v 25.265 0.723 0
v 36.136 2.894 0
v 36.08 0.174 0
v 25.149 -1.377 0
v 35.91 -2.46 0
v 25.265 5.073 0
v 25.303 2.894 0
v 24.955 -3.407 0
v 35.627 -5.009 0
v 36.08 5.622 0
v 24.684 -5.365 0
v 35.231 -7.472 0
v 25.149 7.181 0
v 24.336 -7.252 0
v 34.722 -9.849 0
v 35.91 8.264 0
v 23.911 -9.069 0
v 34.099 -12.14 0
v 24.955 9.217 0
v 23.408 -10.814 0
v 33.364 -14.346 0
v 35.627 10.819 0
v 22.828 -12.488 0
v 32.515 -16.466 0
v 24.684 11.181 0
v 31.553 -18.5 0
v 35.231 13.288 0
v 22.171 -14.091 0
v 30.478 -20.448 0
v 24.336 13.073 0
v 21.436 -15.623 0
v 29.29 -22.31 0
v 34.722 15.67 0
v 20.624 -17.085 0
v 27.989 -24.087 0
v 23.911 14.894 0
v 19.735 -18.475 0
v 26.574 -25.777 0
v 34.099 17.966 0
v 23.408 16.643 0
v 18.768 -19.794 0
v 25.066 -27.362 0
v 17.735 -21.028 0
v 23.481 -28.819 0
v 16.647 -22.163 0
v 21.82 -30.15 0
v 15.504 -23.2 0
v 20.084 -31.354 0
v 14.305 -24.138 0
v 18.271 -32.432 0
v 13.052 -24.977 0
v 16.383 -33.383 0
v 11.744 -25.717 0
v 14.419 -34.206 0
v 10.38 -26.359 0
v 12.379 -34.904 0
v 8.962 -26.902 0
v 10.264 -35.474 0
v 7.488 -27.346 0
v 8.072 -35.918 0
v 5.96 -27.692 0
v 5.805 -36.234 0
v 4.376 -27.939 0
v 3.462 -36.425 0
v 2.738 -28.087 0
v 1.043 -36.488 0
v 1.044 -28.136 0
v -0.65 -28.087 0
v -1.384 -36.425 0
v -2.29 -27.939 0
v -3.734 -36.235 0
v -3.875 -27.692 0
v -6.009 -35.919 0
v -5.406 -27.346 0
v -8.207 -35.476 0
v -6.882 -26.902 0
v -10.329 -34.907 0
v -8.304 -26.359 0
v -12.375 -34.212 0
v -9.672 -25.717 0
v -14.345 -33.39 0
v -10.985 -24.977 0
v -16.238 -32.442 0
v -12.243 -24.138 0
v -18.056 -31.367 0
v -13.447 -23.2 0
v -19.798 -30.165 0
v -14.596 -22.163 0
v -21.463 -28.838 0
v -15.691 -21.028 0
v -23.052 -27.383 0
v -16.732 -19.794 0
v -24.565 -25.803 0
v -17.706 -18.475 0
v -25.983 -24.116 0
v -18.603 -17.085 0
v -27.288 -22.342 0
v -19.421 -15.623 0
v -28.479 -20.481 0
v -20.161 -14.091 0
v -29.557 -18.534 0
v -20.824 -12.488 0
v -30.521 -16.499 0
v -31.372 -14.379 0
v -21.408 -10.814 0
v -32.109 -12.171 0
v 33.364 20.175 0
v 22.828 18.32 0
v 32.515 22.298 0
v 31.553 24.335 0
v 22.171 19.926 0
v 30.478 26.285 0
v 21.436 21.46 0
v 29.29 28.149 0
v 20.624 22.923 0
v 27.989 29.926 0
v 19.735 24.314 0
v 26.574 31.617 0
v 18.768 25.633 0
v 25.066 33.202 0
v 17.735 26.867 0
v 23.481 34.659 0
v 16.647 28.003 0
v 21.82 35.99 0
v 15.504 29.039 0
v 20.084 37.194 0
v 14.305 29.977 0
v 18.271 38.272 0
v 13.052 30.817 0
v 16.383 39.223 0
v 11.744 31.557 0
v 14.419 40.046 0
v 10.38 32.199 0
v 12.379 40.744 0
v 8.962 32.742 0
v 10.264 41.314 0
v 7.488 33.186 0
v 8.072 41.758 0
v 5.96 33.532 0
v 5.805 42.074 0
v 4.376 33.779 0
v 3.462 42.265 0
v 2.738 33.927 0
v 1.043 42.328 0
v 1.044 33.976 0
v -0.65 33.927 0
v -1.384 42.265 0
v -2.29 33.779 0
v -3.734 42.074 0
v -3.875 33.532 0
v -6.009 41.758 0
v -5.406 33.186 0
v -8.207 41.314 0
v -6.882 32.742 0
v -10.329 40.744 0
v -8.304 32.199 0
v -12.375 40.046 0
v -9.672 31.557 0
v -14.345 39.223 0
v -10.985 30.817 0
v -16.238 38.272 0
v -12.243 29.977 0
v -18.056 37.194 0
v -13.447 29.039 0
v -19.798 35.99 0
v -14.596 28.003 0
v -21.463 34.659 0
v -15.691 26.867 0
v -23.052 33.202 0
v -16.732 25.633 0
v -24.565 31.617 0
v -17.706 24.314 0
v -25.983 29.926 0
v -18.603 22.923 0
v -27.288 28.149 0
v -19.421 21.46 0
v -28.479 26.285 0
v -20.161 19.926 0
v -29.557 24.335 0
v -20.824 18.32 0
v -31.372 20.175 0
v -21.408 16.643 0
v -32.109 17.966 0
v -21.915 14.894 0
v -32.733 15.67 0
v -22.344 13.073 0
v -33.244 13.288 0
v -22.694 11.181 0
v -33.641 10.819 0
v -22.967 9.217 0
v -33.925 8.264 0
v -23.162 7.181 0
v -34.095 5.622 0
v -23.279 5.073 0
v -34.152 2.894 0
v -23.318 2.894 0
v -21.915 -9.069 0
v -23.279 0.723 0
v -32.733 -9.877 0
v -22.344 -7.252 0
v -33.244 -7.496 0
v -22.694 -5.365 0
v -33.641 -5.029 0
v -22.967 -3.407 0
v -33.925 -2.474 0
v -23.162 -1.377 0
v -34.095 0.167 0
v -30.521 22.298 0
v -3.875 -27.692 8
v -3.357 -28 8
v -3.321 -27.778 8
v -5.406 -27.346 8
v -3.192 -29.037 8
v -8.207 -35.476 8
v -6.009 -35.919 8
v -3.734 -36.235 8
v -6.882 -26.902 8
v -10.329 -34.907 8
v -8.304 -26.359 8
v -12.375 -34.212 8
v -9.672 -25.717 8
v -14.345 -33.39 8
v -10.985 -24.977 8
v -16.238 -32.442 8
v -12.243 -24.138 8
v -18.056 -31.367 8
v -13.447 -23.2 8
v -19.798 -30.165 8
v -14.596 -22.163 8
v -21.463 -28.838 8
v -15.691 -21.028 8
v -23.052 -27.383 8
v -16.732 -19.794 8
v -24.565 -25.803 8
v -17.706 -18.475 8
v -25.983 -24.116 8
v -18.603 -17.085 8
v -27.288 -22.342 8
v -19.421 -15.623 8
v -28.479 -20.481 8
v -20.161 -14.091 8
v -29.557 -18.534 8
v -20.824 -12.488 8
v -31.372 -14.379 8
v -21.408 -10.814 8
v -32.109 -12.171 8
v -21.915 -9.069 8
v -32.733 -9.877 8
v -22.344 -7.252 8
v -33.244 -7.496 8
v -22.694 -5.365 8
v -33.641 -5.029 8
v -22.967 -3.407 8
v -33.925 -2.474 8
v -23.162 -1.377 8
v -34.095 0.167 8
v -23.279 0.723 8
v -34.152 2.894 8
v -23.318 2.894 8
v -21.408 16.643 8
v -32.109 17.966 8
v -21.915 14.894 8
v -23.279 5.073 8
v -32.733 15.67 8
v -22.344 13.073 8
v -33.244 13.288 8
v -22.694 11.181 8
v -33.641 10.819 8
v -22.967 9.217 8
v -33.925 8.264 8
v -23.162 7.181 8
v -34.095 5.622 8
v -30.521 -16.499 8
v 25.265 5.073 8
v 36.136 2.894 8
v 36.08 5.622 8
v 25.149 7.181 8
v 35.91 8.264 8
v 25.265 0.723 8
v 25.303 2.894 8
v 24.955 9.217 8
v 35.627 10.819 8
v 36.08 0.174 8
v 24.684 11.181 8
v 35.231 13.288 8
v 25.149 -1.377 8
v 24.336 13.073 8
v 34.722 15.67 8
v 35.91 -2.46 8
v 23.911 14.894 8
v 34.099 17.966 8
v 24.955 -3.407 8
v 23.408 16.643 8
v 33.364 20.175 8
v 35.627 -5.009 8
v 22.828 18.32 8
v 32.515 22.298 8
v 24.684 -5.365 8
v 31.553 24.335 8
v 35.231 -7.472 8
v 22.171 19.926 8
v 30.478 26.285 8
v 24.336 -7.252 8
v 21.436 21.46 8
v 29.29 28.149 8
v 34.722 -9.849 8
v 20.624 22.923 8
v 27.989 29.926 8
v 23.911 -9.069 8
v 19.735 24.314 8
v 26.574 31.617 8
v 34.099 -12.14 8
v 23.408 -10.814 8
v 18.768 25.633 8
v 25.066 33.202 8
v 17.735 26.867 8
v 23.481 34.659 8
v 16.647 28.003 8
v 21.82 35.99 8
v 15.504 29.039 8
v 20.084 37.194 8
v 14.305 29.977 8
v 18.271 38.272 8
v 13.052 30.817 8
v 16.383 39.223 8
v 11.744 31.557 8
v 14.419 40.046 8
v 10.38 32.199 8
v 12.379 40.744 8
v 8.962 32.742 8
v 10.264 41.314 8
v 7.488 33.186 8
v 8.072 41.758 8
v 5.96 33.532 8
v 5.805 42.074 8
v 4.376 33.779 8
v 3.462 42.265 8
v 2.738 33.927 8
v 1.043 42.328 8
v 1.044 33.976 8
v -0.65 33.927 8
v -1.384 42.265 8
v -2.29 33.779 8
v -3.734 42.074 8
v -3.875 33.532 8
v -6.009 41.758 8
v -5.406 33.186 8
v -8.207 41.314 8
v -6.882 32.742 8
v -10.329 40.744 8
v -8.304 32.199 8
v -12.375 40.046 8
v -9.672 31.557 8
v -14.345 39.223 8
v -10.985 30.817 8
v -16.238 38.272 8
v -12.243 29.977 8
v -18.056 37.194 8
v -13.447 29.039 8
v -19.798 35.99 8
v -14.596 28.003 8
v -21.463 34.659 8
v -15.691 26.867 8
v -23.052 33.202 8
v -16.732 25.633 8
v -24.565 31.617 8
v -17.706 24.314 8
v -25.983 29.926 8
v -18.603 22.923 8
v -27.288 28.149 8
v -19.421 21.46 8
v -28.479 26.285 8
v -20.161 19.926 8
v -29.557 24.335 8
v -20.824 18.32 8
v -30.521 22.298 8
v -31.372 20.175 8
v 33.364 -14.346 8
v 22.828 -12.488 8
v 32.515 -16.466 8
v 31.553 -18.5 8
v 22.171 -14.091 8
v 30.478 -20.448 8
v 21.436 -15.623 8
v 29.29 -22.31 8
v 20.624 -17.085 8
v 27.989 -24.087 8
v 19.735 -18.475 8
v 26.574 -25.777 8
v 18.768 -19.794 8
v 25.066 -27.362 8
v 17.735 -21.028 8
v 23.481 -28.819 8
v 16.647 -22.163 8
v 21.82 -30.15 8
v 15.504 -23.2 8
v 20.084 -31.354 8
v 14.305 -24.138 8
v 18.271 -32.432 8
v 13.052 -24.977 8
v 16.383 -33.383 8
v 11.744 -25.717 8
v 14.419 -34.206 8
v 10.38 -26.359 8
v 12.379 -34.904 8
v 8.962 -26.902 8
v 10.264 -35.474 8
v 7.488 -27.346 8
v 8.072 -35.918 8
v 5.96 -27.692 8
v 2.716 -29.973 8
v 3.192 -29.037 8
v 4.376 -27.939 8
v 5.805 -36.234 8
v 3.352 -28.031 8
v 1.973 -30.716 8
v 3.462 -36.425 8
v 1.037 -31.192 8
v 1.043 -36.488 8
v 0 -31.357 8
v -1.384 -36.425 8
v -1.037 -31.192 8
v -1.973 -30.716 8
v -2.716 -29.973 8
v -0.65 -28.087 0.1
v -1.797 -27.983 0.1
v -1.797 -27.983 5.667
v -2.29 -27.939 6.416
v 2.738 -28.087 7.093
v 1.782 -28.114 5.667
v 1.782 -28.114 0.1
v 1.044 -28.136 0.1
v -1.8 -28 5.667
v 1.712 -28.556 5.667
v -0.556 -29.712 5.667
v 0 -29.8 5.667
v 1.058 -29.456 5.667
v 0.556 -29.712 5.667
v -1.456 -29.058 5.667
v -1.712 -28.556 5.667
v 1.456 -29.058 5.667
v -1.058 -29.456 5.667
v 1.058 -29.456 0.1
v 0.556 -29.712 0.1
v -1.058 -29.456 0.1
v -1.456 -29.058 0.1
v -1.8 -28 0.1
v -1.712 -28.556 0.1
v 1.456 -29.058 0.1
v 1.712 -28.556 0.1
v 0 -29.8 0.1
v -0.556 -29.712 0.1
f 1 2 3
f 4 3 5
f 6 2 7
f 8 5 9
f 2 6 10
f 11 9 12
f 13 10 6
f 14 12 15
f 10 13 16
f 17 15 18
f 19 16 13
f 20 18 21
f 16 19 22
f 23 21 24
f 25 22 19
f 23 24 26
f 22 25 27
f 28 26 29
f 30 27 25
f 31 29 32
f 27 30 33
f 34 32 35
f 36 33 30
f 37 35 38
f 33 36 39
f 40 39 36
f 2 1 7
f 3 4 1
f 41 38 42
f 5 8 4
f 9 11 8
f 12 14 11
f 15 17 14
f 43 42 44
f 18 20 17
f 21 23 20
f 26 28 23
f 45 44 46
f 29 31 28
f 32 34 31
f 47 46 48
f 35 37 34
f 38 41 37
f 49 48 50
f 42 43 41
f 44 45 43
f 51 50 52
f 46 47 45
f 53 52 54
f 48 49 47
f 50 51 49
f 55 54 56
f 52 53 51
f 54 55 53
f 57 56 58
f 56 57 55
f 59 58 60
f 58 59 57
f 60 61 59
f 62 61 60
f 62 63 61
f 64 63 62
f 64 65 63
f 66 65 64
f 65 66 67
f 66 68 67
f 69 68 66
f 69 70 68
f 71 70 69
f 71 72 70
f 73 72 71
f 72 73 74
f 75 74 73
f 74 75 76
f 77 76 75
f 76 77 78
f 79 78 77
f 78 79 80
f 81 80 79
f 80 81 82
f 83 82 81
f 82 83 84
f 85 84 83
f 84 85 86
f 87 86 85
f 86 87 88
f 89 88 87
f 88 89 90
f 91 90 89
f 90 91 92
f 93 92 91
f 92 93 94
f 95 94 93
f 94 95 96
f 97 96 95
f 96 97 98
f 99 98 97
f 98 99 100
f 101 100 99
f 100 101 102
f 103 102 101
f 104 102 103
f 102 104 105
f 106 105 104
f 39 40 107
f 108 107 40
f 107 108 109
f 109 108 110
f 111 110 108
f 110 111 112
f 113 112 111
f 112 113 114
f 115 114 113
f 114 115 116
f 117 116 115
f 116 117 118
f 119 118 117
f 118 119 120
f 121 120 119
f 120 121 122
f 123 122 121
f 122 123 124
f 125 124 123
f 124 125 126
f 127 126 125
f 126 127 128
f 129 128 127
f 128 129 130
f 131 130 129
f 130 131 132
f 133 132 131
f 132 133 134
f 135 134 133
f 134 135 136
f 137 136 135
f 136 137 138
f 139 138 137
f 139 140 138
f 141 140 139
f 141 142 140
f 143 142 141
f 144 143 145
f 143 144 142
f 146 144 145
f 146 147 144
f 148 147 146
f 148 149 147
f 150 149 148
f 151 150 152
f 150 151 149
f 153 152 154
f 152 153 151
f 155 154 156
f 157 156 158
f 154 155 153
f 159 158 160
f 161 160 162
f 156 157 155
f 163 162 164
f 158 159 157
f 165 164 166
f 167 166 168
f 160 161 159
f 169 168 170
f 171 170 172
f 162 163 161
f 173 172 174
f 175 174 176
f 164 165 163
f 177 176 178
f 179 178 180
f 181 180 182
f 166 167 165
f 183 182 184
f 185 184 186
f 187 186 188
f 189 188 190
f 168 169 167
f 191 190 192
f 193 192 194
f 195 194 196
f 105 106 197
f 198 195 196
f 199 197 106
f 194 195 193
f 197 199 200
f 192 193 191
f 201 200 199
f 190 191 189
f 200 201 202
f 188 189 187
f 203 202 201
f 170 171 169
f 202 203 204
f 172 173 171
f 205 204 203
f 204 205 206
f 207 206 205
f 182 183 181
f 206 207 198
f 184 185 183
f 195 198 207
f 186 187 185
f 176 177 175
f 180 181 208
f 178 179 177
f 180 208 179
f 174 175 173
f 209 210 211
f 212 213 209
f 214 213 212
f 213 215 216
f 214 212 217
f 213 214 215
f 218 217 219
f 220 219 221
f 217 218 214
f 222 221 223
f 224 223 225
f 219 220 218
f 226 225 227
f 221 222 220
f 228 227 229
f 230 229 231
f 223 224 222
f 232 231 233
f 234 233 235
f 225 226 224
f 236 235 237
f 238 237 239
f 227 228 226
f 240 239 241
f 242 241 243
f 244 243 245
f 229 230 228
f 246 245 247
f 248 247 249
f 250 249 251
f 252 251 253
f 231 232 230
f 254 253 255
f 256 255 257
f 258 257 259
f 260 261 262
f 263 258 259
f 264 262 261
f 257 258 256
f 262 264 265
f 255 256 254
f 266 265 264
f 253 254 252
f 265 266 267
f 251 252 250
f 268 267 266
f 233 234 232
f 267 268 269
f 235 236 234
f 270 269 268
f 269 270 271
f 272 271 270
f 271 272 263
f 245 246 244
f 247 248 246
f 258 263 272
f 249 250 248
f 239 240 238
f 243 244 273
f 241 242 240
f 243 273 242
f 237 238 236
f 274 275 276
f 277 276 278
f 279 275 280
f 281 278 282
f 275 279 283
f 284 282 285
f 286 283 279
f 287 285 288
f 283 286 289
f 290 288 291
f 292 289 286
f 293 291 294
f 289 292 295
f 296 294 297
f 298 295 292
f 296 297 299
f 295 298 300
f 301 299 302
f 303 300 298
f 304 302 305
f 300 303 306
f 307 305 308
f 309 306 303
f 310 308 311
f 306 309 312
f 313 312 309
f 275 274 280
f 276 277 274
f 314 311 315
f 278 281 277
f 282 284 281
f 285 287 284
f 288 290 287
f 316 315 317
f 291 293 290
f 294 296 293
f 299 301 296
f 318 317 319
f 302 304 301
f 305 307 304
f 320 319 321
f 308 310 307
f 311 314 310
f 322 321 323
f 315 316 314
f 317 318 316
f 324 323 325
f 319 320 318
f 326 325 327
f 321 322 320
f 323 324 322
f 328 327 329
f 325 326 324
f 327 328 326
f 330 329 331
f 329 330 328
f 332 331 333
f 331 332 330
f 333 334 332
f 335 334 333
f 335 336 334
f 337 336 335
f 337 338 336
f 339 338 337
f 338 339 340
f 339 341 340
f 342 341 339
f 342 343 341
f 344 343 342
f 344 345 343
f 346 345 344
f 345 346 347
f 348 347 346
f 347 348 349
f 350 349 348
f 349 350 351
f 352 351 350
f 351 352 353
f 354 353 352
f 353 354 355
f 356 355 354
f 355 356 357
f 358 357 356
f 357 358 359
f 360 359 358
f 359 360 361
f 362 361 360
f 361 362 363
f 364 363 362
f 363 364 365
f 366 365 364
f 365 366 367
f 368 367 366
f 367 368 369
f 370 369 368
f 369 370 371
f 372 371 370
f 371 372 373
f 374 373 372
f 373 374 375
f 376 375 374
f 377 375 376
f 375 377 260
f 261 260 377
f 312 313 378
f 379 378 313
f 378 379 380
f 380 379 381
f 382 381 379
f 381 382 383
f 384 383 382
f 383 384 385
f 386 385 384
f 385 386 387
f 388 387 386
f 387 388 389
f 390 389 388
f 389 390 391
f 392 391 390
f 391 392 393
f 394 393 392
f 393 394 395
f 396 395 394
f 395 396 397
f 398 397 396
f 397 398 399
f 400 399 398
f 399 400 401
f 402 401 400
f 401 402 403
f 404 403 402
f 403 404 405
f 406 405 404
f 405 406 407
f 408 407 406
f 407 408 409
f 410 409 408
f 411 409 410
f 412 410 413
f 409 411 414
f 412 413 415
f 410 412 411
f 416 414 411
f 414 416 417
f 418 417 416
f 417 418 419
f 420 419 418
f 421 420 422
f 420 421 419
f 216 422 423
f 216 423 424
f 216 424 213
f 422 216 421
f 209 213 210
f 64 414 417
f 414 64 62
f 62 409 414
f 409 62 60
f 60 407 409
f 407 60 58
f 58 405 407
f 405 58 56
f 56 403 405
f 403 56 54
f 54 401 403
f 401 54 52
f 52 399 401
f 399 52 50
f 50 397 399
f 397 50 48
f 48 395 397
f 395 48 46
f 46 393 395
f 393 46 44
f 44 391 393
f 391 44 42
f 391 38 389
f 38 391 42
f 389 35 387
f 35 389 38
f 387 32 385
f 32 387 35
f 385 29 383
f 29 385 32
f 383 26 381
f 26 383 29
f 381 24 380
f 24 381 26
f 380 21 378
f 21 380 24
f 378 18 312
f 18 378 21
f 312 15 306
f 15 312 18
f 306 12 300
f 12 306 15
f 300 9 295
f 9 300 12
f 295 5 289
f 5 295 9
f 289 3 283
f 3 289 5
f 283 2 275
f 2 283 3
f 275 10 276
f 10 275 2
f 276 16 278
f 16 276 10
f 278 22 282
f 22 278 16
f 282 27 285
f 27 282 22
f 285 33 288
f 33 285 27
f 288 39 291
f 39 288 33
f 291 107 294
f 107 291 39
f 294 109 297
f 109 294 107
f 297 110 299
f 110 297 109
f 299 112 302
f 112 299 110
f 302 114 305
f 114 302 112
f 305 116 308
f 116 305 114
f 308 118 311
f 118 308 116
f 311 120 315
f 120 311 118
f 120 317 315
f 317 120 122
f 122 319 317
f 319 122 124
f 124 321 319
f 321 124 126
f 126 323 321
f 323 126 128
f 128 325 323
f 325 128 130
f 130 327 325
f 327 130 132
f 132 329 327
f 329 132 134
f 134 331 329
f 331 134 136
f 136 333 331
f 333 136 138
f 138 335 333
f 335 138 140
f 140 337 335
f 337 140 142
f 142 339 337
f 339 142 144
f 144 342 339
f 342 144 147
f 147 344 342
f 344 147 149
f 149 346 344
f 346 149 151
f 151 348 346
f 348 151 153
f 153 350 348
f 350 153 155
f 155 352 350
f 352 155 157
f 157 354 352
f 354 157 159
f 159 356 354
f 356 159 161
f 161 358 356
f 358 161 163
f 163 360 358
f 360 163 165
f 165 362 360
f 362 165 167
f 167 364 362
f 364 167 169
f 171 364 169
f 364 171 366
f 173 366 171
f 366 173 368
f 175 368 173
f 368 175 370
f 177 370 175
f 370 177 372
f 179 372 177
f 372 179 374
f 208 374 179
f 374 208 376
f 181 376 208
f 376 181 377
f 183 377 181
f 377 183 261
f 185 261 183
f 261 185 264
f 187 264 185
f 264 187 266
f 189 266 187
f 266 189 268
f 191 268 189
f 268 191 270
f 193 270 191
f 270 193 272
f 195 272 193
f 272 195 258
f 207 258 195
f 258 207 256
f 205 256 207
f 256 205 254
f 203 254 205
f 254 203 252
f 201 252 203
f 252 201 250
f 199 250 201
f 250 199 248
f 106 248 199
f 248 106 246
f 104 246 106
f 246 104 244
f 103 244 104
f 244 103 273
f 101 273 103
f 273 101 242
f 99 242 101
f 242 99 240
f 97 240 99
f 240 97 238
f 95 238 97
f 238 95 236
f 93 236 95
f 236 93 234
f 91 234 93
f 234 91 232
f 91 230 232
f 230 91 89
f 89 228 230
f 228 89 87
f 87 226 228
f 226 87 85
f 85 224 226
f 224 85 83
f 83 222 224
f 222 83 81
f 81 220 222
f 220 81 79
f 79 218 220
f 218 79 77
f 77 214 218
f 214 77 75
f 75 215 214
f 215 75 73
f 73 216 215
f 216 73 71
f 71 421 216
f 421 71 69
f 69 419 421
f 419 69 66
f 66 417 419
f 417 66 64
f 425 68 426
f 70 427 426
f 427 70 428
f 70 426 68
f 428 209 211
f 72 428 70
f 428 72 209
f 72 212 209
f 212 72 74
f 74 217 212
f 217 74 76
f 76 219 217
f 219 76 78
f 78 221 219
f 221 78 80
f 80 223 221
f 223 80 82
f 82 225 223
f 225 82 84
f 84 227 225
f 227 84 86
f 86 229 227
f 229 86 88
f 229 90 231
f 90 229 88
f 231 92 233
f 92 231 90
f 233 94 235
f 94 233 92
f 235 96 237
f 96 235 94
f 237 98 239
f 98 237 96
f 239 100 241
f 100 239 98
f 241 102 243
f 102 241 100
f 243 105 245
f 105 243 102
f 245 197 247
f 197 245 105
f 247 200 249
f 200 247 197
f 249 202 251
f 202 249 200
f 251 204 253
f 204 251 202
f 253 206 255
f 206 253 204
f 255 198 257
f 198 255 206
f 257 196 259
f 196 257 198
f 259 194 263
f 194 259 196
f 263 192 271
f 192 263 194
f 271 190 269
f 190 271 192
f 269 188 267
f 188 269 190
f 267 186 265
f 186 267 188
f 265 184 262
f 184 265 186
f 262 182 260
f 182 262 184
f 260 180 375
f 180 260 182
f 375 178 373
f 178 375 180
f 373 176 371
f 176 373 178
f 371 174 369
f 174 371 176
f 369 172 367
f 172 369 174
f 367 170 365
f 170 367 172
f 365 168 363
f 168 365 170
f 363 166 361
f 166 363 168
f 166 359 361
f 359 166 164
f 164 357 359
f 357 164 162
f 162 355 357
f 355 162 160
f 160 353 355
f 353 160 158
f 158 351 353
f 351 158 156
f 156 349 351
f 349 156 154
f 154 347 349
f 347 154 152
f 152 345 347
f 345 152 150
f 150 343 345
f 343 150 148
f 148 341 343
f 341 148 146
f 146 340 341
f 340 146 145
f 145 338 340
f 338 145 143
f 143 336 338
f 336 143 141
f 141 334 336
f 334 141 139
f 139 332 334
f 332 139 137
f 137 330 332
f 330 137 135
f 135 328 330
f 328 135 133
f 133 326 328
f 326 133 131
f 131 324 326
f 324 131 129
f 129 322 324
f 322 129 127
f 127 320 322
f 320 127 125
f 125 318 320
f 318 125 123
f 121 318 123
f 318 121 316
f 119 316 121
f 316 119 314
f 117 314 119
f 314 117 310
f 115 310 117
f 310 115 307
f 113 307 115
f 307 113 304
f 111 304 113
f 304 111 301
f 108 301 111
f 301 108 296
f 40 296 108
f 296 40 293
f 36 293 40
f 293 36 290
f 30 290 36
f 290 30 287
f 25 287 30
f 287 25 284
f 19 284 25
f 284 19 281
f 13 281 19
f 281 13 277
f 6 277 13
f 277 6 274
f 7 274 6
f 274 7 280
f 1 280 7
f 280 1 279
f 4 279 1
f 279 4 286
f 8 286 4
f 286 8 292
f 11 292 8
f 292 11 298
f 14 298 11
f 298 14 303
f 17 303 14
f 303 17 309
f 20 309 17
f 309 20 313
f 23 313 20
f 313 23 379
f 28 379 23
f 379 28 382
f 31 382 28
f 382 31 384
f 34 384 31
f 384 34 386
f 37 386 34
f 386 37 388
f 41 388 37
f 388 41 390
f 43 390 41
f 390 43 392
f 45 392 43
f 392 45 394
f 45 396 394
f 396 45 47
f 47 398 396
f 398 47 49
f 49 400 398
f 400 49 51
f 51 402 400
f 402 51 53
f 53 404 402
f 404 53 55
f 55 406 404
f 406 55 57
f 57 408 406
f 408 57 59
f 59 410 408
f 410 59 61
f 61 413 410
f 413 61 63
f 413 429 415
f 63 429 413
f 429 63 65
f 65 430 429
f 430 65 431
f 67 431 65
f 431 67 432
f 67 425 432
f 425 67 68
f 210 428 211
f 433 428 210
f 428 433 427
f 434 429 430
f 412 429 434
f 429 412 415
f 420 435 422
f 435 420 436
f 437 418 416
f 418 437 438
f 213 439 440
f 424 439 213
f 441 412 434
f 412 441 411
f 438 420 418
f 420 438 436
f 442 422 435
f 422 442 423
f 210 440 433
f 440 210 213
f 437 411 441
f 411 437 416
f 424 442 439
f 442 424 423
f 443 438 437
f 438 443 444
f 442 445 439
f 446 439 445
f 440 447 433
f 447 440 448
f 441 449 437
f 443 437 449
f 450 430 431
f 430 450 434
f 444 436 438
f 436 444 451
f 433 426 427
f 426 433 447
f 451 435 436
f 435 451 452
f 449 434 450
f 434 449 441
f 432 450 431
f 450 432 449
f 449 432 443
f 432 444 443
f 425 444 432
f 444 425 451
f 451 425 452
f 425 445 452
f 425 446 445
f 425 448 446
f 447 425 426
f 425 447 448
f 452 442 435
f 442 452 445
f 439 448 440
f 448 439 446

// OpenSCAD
// Street Numbers for 3D printing
// Charles Tilford, 2019
// License: CC BY-NC-SA 4.0
//   https://creativecommons.org/licenses/by-nc-sa/4.0/

char="O";     // The number/letter to print

// Units are in mm, except for height of letter

// How many inches high should letter be?
inchesHigh=3;
// How thick/deep should letter be (mm)?
depth=8;

// Character coordinates just center the letter
charX=-40;    // Character X coord
charY=-35;    // Character Y coord
topScrew=30;  // Top screw Y coord
botScrew=-28; // Bottom screw Y coord
height=8;     // Thickness of character
// Screw dimensions. Default presumes
// #6 sheet metal screw
screwWid=3.6; // Width of screw shaft
screwTop=6.78;// Width of screw head
screwCon=5.08;// Height of head 'cone'

// Font to print in. Your system needs this
// installed, of course. If changed the hole
// positions almost certainly need to be
// changed, and maybe charX/charY.
fName="Open Sans Extrabold";
// https://fonts.google.com/specimen/Open+Sans
// Designer: Steve Matteson

// Thin floor below holes. My printer was
// struggling to have the hole 'border' stick
// to the stage. Just drill/screw thru it.
holeFloor=0.1; 

// ==========================================
// ===== All values below are auto-calculated
// ==========================================

// Scaled values
scaleFactor=inchesHigh / 3;
cX=charX * scaleFactor;
cY=charY * scaleFactor;
tS=topScrew * scaleFactor;
bS=botScrew * scaleFactor;
// Where do we start drawing screw head cone?
oS=depth - (screwCon-.05);

difference() {
  // We use difference() to punch out the screw holes
  // in the character
    
  // The character itself, 8mm thick
  translate([cX,cY,0])
    linear_extrude(height=depth, scale=1)
    text(char, size=(75*scaleFactor),
         $fn=100, font=fName);
    
  // Bottom screw hole
  translate([0,bS,oS]) color("red")
    cylinder(h=screwCon, d2=screwTop,
             d1=0, $fn=20);
   translate([0,bS,holeFloor])
    cylinder(h=20, d=screwWid, $fn=20);
    
  // Top screw hole
  translate([0,tS,oS]) color("red")
    cylinder(h=screwCon, d2=screwTop,
             d1=0, $fn=20);
  translate([0,tS,holeFloor])
    cylinder(h=20, d=screwWid, $fn=20);
}

// Colors are just to aid visualization of
// void spaces. $fn is "featuer number", ie how
// many polygons are devoted to object. The values
// above should be near your printing limit anyway.

// Developed in OpenSCAD
//    https://www.openscad.org/
